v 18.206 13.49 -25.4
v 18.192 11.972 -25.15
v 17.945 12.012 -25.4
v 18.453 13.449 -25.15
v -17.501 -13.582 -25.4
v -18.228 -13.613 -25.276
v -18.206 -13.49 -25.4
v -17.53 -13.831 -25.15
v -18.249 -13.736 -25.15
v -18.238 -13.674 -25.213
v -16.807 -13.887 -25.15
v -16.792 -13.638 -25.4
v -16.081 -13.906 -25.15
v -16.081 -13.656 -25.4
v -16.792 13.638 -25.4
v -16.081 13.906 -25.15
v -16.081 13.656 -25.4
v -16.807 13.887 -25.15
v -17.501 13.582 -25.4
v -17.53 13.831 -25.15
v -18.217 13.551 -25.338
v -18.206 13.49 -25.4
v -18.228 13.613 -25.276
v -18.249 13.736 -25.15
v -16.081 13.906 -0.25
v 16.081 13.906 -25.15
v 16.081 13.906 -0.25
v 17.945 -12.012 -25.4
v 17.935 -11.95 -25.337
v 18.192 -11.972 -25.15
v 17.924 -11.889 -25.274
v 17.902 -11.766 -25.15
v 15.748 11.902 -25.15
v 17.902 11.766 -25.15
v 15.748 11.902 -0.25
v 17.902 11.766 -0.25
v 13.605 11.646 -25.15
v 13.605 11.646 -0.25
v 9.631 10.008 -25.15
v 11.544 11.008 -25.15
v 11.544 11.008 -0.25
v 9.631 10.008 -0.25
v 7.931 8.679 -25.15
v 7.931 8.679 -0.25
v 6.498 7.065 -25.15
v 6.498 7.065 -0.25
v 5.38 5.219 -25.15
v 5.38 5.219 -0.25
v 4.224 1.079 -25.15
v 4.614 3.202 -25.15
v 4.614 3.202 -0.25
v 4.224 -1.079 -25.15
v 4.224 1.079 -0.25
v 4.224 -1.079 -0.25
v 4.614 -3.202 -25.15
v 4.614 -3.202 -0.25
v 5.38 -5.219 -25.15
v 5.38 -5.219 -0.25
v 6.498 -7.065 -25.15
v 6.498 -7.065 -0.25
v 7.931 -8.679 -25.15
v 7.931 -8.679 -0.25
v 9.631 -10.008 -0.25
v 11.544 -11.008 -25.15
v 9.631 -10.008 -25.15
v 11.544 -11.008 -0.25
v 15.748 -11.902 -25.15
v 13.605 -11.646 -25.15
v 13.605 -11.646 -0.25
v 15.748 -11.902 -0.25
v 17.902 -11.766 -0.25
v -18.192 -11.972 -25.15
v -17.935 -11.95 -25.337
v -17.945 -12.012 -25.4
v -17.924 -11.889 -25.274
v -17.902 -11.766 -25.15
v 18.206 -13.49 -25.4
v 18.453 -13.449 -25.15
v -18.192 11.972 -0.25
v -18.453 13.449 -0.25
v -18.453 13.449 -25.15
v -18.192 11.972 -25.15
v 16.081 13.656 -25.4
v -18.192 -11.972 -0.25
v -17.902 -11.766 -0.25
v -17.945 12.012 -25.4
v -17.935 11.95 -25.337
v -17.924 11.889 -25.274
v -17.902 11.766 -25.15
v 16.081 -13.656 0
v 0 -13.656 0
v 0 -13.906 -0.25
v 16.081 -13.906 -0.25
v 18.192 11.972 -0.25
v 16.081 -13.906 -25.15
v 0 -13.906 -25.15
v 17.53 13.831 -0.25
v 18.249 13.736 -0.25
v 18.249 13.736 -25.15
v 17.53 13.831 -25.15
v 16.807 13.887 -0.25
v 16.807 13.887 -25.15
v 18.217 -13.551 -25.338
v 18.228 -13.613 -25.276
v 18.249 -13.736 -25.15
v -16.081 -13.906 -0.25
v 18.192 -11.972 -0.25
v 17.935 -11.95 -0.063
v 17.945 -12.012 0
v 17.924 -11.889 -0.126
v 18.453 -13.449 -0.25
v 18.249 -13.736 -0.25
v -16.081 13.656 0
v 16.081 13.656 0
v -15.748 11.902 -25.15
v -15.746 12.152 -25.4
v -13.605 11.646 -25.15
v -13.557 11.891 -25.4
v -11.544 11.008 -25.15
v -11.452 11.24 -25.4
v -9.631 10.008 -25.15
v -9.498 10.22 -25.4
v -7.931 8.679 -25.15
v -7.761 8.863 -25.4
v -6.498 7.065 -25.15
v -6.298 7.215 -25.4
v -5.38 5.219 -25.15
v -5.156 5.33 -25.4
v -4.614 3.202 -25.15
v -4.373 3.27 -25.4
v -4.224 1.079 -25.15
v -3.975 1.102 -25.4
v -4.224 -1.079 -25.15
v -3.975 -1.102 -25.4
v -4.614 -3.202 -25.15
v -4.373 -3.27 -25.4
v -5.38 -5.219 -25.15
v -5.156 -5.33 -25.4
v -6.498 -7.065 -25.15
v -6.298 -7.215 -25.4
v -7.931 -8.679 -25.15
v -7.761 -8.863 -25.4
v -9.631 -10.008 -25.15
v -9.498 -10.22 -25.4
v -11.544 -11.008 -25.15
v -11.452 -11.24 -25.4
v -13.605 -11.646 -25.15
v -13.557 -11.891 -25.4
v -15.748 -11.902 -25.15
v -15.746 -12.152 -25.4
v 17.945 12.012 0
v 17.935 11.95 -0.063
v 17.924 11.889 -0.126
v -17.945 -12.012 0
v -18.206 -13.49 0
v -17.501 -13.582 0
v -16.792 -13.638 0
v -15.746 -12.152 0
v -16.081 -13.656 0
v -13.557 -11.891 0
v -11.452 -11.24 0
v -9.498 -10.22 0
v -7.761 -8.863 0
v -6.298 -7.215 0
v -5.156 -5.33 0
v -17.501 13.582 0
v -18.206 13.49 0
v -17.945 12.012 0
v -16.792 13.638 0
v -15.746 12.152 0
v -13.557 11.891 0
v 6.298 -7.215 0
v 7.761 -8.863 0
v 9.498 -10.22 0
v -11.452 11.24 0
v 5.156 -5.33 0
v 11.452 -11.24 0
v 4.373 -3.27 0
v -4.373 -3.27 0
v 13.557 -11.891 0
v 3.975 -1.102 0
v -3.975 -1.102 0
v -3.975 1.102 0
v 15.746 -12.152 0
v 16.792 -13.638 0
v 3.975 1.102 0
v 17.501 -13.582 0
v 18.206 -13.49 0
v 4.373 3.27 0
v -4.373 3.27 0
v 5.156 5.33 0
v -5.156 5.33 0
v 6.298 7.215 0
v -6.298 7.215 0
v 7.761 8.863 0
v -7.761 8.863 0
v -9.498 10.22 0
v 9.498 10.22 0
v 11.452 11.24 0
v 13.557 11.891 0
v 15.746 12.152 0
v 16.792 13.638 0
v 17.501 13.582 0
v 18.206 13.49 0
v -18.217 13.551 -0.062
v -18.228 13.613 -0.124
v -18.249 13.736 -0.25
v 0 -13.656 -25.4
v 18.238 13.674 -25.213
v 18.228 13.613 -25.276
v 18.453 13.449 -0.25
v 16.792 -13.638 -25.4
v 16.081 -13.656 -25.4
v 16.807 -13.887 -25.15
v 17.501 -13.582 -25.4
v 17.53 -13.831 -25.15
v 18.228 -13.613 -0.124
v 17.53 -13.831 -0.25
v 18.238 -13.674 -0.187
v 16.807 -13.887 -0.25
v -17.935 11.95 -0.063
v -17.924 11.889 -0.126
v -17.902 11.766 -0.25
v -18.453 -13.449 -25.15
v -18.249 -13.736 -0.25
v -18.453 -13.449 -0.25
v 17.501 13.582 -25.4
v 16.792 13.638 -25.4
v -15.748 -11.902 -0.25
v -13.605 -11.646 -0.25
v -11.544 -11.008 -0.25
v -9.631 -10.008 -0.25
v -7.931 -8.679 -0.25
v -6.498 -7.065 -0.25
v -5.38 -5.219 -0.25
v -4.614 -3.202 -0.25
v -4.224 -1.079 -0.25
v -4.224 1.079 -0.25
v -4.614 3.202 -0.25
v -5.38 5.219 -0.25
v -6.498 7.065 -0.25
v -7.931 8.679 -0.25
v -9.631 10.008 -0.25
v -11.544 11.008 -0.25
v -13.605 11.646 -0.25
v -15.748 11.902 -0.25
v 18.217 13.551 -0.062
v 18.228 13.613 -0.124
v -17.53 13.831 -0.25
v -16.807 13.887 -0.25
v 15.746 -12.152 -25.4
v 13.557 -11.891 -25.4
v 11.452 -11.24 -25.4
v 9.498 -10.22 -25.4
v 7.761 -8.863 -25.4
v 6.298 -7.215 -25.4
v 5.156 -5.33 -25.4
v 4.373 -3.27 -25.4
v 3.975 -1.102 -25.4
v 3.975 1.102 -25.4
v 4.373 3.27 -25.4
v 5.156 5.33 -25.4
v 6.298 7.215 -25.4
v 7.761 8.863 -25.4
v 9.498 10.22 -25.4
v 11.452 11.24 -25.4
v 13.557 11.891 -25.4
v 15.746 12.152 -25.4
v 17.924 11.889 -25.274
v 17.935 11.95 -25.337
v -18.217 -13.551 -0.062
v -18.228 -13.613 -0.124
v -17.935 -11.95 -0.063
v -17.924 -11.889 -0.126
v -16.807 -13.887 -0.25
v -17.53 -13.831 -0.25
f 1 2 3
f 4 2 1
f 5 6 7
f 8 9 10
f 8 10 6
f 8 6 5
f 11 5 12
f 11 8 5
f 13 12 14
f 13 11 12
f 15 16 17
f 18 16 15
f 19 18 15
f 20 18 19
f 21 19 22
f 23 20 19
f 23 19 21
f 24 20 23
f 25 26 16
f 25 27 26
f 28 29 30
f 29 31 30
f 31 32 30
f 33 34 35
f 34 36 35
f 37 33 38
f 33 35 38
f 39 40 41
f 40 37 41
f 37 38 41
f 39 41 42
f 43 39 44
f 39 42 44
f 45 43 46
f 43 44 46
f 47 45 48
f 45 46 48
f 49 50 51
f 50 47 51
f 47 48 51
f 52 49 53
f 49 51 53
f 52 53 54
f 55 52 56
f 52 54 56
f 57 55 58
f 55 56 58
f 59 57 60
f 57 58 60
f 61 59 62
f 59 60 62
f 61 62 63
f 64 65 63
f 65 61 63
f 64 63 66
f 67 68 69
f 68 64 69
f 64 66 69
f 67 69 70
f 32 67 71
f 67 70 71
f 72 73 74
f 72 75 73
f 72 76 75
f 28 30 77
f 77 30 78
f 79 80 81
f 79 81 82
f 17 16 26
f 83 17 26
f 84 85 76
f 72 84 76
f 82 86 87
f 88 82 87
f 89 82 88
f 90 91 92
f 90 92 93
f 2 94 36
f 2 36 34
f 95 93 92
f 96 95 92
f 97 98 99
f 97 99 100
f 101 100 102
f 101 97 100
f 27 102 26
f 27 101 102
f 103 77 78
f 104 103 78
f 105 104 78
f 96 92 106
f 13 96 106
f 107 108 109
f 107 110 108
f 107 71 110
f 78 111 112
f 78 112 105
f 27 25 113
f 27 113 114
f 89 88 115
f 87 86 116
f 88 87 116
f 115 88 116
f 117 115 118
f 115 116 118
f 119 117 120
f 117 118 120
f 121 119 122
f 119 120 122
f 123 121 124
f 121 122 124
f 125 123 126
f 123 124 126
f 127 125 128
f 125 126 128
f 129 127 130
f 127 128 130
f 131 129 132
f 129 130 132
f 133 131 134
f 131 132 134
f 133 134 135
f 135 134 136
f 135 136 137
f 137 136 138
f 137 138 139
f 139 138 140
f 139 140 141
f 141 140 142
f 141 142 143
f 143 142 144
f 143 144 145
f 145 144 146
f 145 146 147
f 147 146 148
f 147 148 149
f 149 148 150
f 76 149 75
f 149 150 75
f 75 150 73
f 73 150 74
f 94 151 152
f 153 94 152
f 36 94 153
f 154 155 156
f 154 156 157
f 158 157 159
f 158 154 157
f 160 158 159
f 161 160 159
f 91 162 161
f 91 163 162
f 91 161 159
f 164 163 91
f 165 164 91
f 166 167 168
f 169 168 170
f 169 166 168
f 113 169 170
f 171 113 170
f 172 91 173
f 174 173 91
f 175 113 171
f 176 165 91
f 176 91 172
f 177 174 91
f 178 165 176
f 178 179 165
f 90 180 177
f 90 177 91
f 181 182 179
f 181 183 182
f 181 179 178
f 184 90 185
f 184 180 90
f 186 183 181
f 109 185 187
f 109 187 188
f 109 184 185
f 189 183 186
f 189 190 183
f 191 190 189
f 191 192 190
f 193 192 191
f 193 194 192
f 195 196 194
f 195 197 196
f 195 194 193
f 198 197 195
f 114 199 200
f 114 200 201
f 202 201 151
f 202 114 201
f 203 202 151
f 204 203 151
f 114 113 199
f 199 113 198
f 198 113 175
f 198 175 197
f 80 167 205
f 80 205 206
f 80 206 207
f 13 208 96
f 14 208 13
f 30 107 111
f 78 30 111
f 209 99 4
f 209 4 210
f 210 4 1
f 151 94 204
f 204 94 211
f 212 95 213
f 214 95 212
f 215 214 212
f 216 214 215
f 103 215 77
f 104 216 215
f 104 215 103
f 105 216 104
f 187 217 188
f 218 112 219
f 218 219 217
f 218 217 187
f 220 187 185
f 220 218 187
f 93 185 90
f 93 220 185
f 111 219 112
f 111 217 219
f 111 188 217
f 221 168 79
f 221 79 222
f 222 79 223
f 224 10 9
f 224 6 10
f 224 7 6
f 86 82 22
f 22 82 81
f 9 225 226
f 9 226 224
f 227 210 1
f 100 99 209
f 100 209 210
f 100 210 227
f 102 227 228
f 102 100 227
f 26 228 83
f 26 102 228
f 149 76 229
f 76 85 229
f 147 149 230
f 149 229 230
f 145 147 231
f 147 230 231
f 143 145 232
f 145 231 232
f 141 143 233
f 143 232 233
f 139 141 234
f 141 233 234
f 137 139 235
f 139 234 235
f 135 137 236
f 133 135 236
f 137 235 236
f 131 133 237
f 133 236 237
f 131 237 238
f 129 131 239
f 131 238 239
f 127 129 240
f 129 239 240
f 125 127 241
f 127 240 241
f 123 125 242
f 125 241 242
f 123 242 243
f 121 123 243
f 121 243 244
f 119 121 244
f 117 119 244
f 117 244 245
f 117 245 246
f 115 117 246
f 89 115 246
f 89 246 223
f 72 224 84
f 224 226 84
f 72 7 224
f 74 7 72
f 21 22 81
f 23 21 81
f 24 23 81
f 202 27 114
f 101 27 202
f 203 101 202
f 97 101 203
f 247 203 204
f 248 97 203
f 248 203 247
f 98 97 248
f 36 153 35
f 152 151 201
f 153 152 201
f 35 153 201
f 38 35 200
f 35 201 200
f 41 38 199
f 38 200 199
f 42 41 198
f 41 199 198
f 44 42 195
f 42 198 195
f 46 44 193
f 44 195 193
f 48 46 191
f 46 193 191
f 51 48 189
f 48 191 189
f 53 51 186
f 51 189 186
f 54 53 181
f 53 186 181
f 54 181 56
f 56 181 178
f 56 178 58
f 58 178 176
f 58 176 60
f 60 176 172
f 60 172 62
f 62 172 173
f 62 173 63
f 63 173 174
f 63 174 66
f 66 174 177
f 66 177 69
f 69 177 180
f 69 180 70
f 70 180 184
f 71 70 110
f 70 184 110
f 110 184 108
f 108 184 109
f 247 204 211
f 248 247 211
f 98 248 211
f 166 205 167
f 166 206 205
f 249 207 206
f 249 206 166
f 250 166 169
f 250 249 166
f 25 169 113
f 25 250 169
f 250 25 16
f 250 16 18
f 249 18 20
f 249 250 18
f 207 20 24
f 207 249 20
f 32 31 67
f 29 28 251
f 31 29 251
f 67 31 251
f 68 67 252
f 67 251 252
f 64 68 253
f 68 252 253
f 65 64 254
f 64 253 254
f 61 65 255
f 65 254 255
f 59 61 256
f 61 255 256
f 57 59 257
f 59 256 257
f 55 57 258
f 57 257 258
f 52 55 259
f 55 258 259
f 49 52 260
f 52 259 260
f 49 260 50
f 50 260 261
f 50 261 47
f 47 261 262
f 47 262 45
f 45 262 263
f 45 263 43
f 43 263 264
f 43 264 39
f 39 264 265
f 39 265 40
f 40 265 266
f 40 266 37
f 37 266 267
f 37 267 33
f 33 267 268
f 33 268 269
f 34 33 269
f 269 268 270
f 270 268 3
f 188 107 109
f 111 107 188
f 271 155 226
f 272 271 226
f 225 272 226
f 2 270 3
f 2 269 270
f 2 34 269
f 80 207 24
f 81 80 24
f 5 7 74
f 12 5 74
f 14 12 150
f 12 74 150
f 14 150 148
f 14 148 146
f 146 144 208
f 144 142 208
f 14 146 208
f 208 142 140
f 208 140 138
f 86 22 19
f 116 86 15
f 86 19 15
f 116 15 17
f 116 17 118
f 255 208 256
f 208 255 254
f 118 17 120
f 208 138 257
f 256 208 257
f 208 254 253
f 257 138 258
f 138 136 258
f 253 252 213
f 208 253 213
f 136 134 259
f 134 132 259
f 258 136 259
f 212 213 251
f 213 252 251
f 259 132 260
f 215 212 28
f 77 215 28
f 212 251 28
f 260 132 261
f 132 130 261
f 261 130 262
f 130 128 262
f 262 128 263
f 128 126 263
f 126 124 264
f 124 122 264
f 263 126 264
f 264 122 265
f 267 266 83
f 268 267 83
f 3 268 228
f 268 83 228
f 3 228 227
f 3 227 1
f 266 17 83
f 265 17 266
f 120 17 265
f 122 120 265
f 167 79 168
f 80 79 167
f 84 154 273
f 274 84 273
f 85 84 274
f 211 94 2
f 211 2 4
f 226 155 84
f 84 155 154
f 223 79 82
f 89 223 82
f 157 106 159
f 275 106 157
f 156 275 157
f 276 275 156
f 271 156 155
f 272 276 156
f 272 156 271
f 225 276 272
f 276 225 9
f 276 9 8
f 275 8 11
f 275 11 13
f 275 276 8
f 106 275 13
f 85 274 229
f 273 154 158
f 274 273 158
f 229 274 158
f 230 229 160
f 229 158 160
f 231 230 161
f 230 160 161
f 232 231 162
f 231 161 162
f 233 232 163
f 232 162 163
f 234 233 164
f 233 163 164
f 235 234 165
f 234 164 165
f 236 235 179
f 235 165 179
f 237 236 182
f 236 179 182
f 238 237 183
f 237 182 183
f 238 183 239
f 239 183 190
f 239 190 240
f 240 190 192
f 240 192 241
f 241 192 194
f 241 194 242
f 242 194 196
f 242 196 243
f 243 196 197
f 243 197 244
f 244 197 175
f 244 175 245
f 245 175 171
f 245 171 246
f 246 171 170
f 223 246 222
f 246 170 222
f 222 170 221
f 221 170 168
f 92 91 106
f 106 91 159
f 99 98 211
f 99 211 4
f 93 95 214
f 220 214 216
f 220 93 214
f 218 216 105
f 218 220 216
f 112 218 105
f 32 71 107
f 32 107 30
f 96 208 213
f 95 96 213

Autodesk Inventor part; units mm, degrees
ref_plane "YZ Plane" through (0, 0, 0) normal (1, 0, 0) x (0, 1, 0)
ref_plane "XZ Plane" through (0, 0, 0) normal (0, 1, 0) x (-1, 0, 0)
ref_plane "XY Plane" through (0, 0, 0) normal (0, 0, 1) x (1, 0, 0)
sketch "Sketch2" plane through (0, 0, 0) normal (0, 0, 1) x (1, 0, 0)
  arc A0 (-18.496, -13.695) -> (-18.496, 13.695) centre (-16.0813, 0) ccw
  arc A1 (-18.1487, -11.7254) -> (-18.1487, 11.7254) centre (-16.0813, 0) ccw
  line L0 (-16.0813, 0) -> (-18.496, 13.695) construction
  line L1 (-16.0813, 0) -> (-18.496, -13.695) construction
  line L2 (-18.496, 13.695) -> (-18.1487, 11.7254)
  line L3 (-18.496, -13.695) -> (-18.1487, -11.7254)
  line L4 (4.175, 13.9062) -> (4.175, -13.9062)
  line L5 (4.175, 13.9062) -> (-16.0813, 13.9062)
  line L6 (4.175, -13.9062) -> (-16.0812, -13.9063)
  line L7 (-2.175, 13.9062) -> (-2.175, -13.9062) construction
  line L8 (-4.175, 0) -> (4.175, 0) construction
  point P0 (0, 0)
  point P1 (0, 0)
  point P2 (0, 0)
  dimension "d3" = 160
  dimension "d4" = 11.9062
  dimension "d5" = 2
  dimension "d8" = 6.35
extrude "Extrusion1" add sketch "Sketch2" against normal blind 25.4
mirror "Mirror2" about plane through (0, 0, 0) normal (1, 0, 0) of "Extrusion1"
chamfer "Chamfer1" distance 0.25 angle 45 32 edges at (-4.175, 0, 0) (-18.496, -13.695, -12.7) (-18.1487, -11.7254, -12.7) (18.496, -13.695, -12.7) (18.1487, -11.7254, -12.7) (4.175, 0, 0) (18.1487, 11.7254, -12.7) (4.175, 0, -25.4) (-4.175, 0, -25.4) (-18.496, 13.695, -12.7) (-18.1487, 11.7254, -12.7) (0, 13.9062, 0) (-17.2933, 13.8533, 0) (17.2933, 13.8533, 0) (-18.3224, 12.7102, 0) (18.3224, 12.7102, 0) (18.3224, -12.7102, 0) (-17.2933, -13.8533, 0) (0, -13.9063, 0) (17.2933, -13.8533, 0) (-18.3224, -12.7102, 0) (-18.3224, -12.7102, -25.4) (-17.2933, -13.8533, -25.4) (0, -13.9063, -25.4) (17.2933, -13.8533, -25.4) (18.3224, -12.7102, -25.4) (18.3224, 12.7102, -25.4) (18.496, 13.695, -12.7) (0, 13.9062, -25.4) (17.2933, 13.8533, -25.4) (-17.2933, 13.8533, -25.4) (-18.3224, 12.7102, -25.4)
ref_plane "Work Plane3" through (0, 0, 0) normal (1, 0, 0) x (0, 1, 0)
equation "\"d3\" = angle"
equation "\"d5\" = thickness"
equation "\"angle\" = 160deg"
equation "\"thickness\" = 2"
properties part number "two-sided-01"
